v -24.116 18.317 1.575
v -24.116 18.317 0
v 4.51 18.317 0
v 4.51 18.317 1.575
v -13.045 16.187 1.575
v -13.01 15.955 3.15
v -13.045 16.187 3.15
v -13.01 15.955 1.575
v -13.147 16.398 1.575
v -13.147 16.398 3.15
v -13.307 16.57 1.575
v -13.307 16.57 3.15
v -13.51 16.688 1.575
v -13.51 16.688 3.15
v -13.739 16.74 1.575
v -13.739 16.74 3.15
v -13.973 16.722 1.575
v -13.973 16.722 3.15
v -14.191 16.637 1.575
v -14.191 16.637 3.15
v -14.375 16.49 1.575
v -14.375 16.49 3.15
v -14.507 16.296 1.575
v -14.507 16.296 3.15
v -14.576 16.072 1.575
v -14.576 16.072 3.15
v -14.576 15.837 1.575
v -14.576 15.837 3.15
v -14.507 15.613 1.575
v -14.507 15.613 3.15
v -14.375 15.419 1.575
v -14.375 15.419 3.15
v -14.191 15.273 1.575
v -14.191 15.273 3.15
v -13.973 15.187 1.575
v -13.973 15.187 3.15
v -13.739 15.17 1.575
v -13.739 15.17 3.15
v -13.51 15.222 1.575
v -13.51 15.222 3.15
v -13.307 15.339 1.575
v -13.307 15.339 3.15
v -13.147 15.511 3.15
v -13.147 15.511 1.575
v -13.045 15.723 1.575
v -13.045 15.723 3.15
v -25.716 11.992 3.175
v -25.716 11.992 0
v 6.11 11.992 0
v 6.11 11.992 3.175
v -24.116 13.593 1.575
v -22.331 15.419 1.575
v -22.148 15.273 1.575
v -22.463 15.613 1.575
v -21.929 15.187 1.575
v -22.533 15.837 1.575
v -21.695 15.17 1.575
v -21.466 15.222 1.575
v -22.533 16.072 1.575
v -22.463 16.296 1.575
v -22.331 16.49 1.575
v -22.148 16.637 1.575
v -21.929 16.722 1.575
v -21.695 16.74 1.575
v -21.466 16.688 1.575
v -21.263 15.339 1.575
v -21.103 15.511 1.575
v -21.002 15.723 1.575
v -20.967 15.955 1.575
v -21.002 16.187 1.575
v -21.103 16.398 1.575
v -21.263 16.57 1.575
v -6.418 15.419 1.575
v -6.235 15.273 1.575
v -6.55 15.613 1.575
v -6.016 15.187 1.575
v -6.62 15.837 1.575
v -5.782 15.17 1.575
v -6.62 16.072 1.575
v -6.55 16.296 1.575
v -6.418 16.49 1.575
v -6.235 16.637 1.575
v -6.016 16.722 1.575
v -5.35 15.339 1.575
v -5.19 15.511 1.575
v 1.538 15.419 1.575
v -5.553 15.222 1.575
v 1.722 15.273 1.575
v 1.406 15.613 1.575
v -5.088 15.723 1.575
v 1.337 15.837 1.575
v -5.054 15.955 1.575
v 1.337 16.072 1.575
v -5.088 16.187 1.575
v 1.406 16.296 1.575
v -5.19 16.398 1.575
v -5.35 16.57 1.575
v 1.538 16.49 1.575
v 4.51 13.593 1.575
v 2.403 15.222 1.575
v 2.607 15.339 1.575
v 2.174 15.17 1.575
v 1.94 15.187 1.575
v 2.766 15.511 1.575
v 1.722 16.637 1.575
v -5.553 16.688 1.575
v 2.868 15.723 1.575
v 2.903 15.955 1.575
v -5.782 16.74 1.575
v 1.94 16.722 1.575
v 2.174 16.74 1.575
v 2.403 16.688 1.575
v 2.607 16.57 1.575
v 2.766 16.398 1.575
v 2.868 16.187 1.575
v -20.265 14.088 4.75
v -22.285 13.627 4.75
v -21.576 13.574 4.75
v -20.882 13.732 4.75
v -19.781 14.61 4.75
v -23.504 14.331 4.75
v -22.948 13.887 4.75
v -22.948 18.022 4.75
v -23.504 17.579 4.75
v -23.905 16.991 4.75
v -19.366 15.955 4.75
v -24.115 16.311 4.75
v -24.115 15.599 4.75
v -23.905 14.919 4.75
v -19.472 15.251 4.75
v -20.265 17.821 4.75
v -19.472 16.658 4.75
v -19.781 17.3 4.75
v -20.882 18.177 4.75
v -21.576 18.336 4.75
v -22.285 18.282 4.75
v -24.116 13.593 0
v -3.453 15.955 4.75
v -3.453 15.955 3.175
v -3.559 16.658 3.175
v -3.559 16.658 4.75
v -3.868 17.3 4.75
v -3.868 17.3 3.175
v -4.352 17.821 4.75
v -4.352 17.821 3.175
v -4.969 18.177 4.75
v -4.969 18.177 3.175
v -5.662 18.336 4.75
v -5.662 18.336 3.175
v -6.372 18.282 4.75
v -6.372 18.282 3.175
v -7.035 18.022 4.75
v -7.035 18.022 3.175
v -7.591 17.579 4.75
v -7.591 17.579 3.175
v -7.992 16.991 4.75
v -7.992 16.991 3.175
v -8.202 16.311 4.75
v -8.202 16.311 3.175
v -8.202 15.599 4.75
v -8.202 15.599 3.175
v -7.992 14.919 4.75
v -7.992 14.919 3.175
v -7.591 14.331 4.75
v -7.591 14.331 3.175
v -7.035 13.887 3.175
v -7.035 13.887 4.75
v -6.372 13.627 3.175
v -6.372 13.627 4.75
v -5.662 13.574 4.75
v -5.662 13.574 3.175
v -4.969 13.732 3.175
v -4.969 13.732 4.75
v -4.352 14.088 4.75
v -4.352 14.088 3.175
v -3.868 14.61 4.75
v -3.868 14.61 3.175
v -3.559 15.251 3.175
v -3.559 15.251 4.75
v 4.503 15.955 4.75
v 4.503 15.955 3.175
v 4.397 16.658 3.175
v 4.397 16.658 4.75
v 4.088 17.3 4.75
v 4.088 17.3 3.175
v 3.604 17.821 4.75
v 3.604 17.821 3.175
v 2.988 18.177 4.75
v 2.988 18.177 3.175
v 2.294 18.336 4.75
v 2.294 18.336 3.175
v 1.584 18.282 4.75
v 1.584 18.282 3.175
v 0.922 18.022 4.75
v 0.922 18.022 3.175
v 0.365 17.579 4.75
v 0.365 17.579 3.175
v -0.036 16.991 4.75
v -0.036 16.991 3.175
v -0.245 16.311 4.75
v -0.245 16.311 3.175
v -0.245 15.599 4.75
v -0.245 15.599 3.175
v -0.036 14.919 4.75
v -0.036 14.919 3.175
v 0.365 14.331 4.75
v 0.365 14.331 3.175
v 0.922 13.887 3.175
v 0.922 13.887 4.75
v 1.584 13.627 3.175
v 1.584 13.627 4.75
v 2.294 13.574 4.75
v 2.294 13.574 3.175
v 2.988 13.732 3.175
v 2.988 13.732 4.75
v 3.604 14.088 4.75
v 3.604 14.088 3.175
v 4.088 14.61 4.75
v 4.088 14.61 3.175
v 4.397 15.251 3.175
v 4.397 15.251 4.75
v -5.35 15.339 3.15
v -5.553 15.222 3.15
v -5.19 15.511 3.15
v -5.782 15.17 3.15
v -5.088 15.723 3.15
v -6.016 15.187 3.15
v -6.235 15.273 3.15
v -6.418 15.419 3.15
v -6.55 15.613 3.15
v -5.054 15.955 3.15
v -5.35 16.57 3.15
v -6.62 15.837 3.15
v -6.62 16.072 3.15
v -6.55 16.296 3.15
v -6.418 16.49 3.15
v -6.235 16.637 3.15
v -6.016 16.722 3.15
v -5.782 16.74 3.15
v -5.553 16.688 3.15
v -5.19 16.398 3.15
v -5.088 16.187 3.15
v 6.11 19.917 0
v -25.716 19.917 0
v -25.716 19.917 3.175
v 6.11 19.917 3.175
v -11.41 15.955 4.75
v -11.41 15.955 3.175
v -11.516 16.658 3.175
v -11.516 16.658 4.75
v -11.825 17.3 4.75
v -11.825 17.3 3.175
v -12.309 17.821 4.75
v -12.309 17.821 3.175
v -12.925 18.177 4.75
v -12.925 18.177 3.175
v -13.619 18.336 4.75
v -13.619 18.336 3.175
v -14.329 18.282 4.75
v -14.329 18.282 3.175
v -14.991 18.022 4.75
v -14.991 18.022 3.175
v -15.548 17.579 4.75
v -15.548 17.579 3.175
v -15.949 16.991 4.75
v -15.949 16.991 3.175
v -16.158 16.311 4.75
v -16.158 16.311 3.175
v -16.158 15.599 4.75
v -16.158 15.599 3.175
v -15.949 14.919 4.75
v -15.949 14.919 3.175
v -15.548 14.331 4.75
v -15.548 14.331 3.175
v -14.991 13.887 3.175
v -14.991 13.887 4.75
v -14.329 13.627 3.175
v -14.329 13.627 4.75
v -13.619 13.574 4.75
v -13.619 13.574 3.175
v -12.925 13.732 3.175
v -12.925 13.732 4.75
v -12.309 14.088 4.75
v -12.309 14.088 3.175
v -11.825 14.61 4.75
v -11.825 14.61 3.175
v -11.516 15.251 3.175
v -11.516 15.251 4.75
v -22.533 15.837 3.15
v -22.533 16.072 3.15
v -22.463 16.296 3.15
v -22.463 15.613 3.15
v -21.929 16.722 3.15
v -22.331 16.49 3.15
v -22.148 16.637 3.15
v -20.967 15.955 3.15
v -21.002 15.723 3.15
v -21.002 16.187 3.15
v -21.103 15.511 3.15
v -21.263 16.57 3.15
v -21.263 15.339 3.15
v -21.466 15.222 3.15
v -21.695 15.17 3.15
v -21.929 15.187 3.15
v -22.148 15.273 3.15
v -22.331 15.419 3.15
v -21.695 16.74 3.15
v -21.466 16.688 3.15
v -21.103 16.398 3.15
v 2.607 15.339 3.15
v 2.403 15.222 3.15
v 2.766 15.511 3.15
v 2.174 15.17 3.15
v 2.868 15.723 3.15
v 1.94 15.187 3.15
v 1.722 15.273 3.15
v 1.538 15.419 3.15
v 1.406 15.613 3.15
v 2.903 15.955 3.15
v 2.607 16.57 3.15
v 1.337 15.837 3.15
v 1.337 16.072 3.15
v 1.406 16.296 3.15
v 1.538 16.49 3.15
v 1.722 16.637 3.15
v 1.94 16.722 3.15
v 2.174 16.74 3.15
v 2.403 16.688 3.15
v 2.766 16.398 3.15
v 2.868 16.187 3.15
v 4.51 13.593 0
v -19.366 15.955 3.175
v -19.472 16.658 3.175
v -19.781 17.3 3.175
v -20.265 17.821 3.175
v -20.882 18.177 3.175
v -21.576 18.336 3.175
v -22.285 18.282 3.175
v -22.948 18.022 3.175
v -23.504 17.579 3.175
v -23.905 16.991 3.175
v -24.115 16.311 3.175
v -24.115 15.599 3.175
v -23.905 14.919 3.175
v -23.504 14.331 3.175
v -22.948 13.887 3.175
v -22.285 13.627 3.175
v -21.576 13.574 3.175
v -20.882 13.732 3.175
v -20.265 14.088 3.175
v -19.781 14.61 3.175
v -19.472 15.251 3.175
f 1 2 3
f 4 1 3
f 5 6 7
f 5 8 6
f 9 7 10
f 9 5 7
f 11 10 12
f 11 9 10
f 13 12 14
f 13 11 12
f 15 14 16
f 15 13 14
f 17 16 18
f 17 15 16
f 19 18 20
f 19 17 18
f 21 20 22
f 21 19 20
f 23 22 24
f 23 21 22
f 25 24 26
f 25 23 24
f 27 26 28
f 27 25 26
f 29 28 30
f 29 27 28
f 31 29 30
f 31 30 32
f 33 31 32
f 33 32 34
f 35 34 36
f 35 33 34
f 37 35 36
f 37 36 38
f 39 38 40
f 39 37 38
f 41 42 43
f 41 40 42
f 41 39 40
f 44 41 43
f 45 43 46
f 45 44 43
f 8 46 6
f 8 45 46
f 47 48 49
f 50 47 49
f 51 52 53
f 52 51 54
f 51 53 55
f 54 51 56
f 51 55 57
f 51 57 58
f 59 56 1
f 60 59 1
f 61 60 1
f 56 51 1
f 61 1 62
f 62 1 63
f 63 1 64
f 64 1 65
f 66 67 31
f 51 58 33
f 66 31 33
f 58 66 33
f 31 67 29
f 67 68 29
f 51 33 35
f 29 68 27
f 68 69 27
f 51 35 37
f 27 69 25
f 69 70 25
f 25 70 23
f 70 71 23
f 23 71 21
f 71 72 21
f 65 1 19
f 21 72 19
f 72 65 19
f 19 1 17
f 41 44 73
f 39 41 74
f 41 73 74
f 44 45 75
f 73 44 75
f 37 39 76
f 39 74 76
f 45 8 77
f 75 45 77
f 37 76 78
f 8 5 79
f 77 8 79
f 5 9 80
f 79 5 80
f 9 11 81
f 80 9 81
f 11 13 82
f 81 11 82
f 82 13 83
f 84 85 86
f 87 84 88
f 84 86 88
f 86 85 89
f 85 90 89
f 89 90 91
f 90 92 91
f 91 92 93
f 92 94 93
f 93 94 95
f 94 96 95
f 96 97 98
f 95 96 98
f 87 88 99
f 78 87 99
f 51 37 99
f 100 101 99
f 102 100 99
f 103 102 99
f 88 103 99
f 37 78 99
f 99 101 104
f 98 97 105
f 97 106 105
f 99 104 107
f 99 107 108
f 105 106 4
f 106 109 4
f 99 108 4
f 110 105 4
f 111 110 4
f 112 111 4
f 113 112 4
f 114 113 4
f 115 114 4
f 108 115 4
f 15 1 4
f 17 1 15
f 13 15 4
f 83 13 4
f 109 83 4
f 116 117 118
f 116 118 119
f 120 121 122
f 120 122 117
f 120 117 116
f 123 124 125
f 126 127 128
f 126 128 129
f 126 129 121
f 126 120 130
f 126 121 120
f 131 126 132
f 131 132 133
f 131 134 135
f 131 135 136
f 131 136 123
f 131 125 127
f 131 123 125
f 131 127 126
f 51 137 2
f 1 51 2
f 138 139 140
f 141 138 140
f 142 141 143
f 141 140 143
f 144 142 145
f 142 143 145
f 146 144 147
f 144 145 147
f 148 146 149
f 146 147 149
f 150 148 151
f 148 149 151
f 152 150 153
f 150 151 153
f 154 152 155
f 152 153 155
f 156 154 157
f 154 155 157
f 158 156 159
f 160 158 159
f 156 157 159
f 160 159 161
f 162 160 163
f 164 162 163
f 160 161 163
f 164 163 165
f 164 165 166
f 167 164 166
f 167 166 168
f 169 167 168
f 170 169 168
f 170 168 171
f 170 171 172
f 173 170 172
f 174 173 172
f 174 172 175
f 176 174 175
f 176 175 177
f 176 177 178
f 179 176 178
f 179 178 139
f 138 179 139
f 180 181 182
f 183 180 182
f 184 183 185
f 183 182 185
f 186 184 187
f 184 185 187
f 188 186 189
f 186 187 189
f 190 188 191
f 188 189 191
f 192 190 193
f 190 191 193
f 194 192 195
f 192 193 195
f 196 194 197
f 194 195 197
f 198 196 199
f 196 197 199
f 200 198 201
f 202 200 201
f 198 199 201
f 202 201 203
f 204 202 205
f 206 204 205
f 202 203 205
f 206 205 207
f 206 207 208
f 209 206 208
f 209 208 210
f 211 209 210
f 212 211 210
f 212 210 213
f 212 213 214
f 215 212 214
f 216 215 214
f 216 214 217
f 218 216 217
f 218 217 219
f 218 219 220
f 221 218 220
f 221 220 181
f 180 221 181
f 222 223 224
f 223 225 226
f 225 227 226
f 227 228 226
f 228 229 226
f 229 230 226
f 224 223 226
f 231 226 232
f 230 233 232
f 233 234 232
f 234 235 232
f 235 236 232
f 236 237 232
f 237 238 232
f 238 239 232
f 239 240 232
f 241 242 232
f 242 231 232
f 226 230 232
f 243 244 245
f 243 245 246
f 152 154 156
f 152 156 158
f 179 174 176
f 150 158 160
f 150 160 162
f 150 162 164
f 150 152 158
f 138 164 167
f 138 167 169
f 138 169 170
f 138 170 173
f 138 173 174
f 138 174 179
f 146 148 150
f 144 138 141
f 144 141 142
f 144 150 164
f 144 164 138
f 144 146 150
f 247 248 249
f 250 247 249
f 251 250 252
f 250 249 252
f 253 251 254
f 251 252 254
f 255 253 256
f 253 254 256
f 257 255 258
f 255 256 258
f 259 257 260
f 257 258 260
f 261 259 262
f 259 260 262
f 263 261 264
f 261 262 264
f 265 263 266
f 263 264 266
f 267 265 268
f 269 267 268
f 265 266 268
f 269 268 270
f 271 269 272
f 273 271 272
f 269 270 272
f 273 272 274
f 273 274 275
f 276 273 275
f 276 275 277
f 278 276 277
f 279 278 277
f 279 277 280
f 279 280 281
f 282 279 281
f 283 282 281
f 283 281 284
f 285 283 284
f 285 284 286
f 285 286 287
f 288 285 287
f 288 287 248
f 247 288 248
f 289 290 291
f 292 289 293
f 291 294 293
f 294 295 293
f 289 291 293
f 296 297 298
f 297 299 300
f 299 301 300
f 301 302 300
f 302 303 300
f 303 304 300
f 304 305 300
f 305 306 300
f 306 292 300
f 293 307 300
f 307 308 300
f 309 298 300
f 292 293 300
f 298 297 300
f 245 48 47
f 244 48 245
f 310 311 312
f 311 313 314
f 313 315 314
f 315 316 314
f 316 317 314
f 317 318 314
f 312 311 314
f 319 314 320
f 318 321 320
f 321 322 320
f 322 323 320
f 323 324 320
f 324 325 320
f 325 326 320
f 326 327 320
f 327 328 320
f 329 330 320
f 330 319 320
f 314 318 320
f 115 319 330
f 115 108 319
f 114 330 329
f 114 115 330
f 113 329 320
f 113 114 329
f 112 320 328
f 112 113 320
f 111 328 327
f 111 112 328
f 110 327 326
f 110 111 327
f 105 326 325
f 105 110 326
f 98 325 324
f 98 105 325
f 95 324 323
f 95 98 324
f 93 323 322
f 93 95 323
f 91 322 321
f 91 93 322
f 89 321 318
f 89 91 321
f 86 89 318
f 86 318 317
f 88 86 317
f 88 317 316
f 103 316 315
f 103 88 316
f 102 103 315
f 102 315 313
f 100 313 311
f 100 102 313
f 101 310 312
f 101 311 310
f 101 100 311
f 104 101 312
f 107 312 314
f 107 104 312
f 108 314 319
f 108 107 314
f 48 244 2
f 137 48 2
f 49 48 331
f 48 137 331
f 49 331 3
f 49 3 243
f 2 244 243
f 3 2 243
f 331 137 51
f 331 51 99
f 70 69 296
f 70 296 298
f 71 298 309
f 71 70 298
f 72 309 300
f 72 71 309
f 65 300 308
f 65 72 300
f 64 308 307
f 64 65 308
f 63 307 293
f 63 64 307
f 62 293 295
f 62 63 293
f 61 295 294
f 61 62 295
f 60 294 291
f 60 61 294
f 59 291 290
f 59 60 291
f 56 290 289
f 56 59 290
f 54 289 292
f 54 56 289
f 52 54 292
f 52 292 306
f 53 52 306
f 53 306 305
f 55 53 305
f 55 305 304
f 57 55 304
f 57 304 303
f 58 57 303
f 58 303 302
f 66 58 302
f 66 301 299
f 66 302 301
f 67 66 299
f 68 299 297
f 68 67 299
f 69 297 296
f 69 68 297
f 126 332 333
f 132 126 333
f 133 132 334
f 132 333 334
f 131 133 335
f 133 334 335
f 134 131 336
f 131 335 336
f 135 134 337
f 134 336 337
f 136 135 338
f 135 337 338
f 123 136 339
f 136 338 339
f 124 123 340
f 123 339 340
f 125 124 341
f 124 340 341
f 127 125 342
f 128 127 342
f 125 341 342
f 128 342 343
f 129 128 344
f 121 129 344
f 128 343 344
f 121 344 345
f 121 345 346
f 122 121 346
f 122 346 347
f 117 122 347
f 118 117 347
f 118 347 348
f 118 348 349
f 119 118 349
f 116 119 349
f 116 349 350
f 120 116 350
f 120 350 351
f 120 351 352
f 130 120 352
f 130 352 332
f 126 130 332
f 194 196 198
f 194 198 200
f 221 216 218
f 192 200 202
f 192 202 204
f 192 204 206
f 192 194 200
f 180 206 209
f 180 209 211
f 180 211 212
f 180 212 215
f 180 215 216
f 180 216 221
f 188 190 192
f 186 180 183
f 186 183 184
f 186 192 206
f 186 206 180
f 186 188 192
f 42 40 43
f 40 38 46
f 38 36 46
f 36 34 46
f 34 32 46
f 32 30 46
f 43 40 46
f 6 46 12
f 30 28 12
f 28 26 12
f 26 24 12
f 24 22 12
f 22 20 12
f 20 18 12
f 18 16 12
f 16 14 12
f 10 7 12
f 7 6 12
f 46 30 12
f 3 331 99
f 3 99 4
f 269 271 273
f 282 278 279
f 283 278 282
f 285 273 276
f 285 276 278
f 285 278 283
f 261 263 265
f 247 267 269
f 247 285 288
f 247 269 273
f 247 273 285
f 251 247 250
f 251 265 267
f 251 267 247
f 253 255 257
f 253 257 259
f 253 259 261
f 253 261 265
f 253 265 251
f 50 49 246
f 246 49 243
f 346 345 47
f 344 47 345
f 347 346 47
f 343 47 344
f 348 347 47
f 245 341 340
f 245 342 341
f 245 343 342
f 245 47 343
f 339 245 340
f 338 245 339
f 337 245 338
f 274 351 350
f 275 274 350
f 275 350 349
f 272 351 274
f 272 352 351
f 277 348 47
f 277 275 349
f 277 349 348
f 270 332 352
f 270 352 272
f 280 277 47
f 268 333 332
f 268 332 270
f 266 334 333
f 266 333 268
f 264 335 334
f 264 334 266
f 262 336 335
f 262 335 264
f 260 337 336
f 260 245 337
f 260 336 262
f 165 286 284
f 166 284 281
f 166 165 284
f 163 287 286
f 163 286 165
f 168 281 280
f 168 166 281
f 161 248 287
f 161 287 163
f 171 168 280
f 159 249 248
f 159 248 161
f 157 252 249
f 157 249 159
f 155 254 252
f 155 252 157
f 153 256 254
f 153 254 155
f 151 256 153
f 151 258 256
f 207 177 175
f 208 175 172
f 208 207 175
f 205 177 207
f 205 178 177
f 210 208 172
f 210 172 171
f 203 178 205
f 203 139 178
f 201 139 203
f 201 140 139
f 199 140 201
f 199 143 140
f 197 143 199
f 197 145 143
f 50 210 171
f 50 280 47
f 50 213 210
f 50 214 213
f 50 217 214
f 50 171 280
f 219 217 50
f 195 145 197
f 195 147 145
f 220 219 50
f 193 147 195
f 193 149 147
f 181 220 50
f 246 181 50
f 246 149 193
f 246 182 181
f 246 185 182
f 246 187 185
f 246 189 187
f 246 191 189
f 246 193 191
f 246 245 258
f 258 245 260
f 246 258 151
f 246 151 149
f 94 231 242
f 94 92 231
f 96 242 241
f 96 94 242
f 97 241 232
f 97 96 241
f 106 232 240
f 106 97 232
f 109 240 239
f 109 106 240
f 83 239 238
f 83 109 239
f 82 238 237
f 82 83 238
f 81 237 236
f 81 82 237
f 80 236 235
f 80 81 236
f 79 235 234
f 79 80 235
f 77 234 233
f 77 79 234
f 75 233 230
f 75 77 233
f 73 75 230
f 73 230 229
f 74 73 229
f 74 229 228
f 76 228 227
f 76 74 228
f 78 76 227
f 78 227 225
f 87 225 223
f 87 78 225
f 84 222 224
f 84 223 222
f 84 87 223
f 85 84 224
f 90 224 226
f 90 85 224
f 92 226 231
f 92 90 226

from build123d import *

# Parameters (mm, degrees)
F0_W     = 31.8262
F0_H     = 7.9248
F0_R     = 2.3876
F1_DEPTH = 3.175
F2_DEPTH = 4.7498
F3_T     = -1.6002


with BuildPart() as f1:
    # F0 (on Top) → F1 (new body)
    with BuildSketch(Plane.XY):
        with Locations((-9.8033006705, 15.9547276562)):
            Rectangle(F0_W, F0_H)
        with Locations((-21.7540006705, 15.9547276562)):
            Circle(F0_R, mode=Mode.SUBTRACT)
        with Locations((-13.7974506705, 15.9547276562)):
            Circle(F0_R, mode=Mode.SUBTRACT)
        with Locations((-5.8409006705, 15.9547276562)):
            Circle(F0_R, mode=Mode.SUBTRACT)
        with Locations((2.1156493295, 15.9547276562)):
            Circle(F0_R, mode=Mode.SUBTRACT)
    extrude(amount=F1_DEPTH)

    # F0 (on Top) → F2 (join)
    with BuildSketch(Plane.XY):
        with Locations((-21.7540006705, 15.9547276562)):
            Circle(F0_R)
        with Locations((-13.7974506705, 15.9547276562)):
            Circle(F0_R)
        with Locations((-5.8409006705, 15.9547276562)):
            Circle(F0_R)
        with Locations((2.1156493295, 15.9547276562)):
            Circle(F0_R)
    extrude(amount=F2_DEPTH)

    # F3
    f3_openings = [f1.faces().sort_by_distance(p)[0] for p in [
        (-9.803301, 15.954728, 0),
    ]]
    offset(amount=F3_T, openings=f3_openings, kind=Kind.INTERSECTION)


solid = f1.part
